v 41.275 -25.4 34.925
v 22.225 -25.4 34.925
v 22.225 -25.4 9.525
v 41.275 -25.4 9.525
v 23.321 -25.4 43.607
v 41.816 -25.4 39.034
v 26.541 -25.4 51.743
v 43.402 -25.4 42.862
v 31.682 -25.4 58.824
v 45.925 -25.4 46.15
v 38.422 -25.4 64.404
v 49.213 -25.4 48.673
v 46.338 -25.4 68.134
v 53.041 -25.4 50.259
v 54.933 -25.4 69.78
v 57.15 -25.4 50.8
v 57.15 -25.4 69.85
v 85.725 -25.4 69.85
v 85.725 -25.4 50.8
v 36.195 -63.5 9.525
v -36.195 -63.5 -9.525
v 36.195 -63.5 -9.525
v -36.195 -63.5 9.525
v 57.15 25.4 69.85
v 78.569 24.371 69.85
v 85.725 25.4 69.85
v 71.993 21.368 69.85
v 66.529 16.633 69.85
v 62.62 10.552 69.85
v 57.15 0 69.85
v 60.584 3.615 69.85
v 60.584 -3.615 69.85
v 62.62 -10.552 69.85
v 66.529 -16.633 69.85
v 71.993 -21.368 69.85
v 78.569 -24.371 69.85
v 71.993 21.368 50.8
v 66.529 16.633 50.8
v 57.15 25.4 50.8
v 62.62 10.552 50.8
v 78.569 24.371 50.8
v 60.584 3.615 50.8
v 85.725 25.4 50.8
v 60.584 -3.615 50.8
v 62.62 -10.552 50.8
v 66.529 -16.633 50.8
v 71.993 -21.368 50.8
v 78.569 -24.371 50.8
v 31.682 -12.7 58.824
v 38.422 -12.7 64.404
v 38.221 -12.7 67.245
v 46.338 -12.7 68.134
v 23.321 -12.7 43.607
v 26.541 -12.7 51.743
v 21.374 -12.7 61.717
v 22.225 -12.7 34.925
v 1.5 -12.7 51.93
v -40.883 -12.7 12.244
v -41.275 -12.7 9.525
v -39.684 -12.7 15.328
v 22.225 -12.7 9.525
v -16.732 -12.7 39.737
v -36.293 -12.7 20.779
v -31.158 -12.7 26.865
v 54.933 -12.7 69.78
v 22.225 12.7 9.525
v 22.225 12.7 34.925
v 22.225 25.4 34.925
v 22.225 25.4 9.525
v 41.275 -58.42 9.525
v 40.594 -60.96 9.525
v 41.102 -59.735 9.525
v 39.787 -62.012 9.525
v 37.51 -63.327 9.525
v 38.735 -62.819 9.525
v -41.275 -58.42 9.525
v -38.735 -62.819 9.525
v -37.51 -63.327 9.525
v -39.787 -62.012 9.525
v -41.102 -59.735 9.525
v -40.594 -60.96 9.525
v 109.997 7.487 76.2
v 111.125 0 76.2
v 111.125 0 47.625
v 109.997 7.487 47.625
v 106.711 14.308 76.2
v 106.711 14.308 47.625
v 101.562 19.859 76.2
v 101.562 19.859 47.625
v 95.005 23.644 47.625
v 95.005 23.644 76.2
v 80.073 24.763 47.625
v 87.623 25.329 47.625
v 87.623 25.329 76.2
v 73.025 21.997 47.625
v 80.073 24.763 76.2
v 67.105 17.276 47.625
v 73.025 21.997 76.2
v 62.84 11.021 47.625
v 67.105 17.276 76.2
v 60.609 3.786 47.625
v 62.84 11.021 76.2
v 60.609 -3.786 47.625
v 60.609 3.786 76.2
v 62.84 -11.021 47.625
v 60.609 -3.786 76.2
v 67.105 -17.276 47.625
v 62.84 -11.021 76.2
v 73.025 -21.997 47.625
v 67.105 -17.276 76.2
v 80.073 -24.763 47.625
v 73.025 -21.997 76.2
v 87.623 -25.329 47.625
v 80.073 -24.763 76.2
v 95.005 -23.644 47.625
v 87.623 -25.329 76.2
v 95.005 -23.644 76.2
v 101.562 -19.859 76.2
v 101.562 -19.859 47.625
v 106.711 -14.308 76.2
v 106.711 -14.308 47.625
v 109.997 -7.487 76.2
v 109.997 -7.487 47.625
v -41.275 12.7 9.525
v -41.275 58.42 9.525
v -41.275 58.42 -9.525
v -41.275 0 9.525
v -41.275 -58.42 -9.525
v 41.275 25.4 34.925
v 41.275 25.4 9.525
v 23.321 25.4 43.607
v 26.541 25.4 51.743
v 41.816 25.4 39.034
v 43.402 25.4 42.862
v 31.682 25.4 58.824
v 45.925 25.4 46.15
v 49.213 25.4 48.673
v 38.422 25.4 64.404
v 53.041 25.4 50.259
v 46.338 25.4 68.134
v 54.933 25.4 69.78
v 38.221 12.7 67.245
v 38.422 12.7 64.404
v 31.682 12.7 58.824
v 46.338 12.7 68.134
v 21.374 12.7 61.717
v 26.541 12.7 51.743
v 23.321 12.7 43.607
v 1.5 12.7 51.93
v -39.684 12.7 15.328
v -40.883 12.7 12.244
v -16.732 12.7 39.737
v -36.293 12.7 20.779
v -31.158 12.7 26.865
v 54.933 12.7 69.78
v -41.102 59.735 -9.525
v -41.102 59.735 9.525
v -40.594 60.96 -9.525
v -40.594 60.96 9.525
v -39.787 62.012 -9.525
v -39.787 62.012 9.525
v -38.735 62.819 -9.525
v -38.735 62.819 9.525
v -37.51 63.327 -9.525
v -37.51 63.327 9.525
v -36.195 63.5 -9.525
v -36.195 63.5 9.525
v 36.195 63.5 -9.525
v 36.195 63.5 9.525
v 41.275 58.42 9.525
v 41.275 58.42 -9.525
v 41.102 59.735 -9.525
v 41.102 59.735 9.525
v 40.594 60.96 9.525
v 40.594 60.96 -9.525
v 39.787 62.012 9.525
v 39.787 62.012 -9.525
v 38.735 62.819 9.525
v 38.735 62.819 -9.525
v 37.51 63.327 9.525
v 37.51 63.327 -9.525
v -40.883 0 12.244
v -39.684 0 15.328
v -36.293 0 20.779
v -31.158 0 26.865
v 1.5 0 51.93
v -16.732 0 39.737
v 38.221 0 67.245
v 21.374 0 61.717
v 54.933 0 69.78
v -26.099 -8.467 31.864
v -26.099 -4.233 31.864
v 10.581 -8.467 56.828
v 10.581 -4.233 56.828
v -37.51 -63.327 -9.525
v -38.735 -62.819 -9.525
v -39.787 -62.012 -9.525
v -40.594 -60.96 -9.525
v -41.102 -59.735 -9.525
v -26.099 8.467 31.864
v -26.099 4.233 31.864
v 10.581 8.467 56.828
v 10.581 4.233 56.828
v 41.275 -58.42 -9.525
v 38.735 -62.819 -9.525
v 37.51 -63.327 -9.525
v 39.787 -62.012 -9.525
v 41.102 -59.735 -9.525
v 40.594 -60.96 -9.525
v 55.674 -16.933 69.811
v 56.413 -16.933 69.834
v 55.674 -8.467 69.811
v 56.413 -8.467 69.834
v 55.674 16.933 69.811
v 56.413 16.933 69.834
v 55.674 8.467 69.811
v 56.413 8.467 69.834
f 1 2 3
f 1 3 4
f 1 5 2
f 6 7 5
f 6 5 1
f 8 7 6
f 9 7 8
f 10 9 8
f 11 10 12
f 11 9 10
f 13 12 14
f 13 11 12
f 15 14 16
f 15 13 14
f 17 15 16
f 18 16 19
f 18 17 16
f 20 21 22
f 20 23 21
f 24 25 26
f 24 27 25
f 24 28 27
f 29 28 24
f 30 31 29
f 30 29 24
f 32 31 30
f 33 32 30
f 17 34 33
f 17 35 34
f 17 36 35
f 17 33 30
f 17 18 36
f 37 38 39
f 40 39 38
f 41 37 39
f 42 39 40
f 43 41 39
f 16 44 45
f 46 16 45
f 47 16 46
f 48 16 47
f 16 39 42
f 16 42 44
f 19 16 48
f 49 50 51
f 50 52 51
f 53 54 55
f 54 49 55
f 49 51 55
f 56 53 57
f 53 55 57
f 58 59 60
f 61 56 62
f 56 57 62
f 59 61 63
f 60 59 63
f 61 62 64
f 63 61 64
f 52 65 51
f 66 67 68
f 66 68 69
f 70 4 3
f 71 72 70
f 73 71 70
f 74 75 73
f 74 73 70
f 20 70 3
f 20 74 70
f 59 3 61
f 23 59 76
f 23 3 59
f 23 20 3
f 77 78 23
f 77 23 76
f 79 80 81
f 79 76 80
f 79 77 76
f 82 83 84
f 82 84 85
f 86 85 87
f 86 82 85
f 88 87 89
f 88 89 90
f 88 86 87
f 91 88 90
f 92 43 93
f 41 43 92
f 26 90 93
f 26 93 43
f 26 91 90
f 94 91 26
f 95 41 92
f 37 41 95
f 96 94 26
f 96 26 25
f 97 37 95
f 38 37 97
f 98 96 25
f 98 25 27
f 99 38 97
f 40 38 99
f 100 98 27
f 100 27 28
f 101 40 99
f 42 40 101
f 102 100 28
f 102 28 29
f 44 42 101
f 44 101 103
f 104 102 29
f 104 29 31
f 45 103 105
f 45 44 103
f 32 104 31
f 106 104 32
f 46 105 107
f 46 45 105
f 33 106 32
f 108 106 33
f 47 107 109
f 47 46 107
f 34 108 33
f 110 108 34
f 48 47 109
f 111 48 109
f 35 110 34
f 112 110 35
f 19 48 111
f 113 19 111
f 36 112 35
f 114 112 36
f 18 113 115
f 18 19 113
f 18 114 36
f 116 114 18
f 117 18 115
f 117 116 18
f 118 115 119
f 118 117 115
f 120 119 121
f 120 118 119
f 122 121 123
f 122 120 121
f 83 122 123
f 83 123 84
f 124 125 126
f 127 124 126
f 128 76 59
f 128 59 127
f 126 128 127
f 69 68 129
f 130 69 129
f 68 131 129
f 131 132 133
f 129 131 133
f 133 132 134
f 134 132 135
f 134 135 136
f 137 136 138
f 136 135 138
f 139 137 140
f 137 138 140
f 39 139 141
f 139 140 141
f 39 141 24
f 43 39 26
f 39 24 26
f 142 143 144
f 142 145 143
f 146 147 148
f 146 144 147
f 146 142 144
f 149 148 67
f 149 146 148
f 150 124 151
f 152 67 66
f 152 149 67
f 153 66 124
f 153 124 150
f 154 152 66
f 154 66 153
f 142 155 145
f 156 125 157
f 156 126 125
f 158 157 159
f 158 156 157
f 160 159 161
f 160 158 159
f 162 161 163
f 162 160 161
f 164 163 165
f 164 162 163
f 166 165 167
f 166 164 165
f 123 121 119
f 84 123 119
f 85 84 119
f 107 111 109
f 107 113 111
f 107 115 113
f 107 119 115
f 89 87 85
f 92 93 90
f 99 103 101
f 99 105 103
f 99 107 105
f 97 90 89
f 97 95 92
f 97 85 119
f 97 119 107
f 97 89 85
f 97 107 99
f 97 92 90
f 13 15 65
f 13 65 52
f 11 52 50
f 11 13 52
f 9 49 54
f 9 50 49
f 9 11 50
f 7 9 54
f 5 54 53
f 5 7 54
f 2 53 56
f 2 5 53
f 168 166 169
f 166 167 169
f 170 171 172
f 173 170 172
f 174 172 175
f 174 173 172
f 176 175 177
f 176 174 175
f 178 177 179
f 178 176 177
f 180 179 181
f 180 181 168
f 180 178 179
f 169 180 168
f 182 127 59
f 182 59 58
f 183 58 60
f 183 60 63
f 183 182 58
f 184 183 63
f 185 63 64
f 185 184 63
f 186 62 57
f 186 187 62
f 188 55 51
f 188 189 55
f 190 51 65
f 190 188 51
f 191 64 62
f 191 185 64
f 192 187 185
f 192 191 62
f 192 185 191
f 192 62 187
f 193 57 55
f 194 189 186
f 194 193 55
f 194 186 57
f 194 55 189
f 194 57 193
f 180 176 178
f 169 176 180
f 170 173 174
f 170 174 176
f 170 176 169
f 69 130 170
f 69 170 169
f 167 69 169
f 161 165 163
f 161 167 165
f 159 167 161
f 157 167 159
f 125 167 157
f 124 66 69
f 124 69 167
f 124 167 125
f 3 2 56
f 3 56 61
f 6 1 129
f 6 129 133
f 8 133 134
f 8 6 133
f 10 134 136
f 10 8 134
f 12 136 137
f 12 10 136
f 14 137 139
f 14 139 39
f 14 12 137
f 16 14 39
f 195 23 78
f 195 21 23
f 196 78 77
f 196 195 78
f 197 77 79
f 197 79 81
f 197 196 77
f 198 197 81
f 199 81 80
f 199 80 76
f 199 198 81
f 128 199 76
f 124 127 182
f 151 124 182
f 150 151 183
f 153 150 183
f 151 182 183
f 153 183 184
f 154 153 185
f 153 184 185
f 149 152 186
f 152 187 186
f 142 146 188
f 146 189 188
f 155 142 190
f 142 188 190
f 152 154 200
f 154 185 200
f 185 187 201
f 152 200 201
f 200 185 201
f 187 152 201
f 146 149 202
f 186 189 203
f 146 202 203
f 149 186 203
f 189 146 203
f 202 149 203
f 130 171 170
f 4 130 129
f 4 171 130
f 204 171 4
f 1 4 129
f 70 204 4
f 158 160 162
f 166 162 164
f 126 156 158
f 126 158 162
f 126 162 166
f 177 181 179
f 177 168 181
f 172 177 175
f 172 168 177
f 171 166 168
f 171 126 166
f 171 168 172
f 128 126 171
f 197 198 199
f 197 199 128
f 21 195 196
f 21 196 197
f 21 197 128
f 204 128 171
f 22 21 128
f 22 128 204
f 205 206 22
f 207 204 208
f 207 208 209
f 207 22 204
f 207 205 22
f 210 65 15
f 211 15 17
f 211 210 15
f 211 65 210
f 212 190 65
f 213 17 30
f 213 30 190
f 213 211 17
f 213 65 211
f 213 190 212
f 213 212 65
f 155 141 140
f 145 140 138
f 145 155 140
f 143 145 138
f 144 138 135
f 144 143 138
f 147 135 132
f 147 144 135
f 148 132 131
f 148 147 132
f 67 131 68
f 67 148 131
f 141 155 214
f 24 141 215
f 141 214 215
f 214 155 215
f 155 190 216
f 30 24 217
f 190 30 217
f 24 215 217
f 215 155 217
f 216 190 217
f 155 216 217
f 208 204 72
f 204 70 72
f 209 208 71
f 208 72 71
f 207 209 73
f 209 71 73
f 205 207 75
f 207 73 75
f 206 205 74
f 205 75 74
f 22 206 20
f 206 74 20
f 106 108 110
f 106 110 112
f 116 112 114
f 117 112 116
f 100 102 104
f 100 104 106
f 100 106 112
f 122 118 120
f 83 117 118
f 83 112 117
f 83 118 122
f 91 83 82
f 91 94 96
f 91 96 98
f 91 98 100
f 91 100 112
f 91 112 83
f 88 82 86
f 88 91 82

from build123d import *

# Parameters (mm, degrees)
F1_DEPTH = 63.5
F2_DEPTH = 25.4
F3_DEPTH = 12.7
F5_R     = 5.08


with BuildPart() as f1:
    # F0 (on Front) → F1 (new body, symmetric)
    with BuildSketch(Plane.XZ):
        Polygon((22.225, 9.525), (-41.275, 9.525), (-41.275, -9.525), (41.275, -9.525), (41.275, 9.525), align=None)
    extrude(amount=F1_DEPTH, both=True)

    # F0 (on Front) → F2 (join, symmetric)
    with BuildSketch(Plane.XZ):
        with BuildLine():
            Line((22.225, 34.925), (22.225, 9.525))
            Line((22.225, 9.525), (41.275, 9.525))
            Line((41.275, 9.525), (41.275, 34.925))
            ThreePointArc((41.275, 34.925), (45.92468, 46.15032), (57.15, 50.8))
            Line((57.15, 50.8), (60.325, 50.8))
            Line((60.325, 50.8), (60.325, 69.85))
            Line((60.325, 69.85), (57.15, 69.85))
            add(Edge.make_bspline(
                [(54.932606, 69.779538), (55.674519, 69.814721), (56.413753, 69.838317), (57.15, 69.85)],
                knots=[113.508266, 113.508266, 113.508266, 113.508266, 115.440834, 115.440834, 115.440834, 115.440834], degree=3))
            ThreePointArc((54.932606, 69.779538), (31.682392, 58.823882), (22.225, 34.925))
        make_face()
        Polygon((73.748745, 69.85), (60.325, 69.85), (60.325, 50.8), (73.748745, 50.8), (85.725, 50.8), (85.725, 61.9125), (85.725, 69.85), align=None)
    extrude(amount=F2_DEPTH, both=True)

    # F0 (on Front) → F3 (join, symmetric)
    with BuildSketch(Plane.XZ):
        with BuildLine():
            add(Edge.make_bspline(
                [(-41.275, 9.525), (-41.462009, 25.67143), (11.356779, 67.713042), (54.932606, 69.779538)],
                knots=[0, 0, 0, 0, 113.508266, 113.508266, 113.508266, 113.508266], degree=3))
            Line((-41.275, 9.525), (22.225, 9.525))
            Line((22.225, 9.525), (22.225, 34.925))
            ThreePointArc((22.225, 34.925), (31.682392, 58.823882), (54.932606, 69.779538))
        make_face()
    extrude(amount=F3_DEPTH, both=True)

    # F0 (on Front) → F4 (revolve)
    with BuildSketch(Plane.XZ):
        Polygon((111.125, 76.2), (85.725, 76.2), (85.725, 69.85), (85.725, 61.9125), (85.725, 50.8), (85.725, 47.625), (111.125, 47.625), align=None)
    revolve(axis=Axis((85.725, 0, 61.9125), (0, 0, 1)))

    # F5
    f5_edges = [f1.edges().sort_by_distance(p)[0] for p in [
        (-41.275, -63.5, 0),
        (41.275, -63.5, 0),
        (41.275, 63.5, 0),
        (-41.275, 63.5, 0),
    ]]
    fillet(f5_edges, radius=F5_R)


solid = f1.part
